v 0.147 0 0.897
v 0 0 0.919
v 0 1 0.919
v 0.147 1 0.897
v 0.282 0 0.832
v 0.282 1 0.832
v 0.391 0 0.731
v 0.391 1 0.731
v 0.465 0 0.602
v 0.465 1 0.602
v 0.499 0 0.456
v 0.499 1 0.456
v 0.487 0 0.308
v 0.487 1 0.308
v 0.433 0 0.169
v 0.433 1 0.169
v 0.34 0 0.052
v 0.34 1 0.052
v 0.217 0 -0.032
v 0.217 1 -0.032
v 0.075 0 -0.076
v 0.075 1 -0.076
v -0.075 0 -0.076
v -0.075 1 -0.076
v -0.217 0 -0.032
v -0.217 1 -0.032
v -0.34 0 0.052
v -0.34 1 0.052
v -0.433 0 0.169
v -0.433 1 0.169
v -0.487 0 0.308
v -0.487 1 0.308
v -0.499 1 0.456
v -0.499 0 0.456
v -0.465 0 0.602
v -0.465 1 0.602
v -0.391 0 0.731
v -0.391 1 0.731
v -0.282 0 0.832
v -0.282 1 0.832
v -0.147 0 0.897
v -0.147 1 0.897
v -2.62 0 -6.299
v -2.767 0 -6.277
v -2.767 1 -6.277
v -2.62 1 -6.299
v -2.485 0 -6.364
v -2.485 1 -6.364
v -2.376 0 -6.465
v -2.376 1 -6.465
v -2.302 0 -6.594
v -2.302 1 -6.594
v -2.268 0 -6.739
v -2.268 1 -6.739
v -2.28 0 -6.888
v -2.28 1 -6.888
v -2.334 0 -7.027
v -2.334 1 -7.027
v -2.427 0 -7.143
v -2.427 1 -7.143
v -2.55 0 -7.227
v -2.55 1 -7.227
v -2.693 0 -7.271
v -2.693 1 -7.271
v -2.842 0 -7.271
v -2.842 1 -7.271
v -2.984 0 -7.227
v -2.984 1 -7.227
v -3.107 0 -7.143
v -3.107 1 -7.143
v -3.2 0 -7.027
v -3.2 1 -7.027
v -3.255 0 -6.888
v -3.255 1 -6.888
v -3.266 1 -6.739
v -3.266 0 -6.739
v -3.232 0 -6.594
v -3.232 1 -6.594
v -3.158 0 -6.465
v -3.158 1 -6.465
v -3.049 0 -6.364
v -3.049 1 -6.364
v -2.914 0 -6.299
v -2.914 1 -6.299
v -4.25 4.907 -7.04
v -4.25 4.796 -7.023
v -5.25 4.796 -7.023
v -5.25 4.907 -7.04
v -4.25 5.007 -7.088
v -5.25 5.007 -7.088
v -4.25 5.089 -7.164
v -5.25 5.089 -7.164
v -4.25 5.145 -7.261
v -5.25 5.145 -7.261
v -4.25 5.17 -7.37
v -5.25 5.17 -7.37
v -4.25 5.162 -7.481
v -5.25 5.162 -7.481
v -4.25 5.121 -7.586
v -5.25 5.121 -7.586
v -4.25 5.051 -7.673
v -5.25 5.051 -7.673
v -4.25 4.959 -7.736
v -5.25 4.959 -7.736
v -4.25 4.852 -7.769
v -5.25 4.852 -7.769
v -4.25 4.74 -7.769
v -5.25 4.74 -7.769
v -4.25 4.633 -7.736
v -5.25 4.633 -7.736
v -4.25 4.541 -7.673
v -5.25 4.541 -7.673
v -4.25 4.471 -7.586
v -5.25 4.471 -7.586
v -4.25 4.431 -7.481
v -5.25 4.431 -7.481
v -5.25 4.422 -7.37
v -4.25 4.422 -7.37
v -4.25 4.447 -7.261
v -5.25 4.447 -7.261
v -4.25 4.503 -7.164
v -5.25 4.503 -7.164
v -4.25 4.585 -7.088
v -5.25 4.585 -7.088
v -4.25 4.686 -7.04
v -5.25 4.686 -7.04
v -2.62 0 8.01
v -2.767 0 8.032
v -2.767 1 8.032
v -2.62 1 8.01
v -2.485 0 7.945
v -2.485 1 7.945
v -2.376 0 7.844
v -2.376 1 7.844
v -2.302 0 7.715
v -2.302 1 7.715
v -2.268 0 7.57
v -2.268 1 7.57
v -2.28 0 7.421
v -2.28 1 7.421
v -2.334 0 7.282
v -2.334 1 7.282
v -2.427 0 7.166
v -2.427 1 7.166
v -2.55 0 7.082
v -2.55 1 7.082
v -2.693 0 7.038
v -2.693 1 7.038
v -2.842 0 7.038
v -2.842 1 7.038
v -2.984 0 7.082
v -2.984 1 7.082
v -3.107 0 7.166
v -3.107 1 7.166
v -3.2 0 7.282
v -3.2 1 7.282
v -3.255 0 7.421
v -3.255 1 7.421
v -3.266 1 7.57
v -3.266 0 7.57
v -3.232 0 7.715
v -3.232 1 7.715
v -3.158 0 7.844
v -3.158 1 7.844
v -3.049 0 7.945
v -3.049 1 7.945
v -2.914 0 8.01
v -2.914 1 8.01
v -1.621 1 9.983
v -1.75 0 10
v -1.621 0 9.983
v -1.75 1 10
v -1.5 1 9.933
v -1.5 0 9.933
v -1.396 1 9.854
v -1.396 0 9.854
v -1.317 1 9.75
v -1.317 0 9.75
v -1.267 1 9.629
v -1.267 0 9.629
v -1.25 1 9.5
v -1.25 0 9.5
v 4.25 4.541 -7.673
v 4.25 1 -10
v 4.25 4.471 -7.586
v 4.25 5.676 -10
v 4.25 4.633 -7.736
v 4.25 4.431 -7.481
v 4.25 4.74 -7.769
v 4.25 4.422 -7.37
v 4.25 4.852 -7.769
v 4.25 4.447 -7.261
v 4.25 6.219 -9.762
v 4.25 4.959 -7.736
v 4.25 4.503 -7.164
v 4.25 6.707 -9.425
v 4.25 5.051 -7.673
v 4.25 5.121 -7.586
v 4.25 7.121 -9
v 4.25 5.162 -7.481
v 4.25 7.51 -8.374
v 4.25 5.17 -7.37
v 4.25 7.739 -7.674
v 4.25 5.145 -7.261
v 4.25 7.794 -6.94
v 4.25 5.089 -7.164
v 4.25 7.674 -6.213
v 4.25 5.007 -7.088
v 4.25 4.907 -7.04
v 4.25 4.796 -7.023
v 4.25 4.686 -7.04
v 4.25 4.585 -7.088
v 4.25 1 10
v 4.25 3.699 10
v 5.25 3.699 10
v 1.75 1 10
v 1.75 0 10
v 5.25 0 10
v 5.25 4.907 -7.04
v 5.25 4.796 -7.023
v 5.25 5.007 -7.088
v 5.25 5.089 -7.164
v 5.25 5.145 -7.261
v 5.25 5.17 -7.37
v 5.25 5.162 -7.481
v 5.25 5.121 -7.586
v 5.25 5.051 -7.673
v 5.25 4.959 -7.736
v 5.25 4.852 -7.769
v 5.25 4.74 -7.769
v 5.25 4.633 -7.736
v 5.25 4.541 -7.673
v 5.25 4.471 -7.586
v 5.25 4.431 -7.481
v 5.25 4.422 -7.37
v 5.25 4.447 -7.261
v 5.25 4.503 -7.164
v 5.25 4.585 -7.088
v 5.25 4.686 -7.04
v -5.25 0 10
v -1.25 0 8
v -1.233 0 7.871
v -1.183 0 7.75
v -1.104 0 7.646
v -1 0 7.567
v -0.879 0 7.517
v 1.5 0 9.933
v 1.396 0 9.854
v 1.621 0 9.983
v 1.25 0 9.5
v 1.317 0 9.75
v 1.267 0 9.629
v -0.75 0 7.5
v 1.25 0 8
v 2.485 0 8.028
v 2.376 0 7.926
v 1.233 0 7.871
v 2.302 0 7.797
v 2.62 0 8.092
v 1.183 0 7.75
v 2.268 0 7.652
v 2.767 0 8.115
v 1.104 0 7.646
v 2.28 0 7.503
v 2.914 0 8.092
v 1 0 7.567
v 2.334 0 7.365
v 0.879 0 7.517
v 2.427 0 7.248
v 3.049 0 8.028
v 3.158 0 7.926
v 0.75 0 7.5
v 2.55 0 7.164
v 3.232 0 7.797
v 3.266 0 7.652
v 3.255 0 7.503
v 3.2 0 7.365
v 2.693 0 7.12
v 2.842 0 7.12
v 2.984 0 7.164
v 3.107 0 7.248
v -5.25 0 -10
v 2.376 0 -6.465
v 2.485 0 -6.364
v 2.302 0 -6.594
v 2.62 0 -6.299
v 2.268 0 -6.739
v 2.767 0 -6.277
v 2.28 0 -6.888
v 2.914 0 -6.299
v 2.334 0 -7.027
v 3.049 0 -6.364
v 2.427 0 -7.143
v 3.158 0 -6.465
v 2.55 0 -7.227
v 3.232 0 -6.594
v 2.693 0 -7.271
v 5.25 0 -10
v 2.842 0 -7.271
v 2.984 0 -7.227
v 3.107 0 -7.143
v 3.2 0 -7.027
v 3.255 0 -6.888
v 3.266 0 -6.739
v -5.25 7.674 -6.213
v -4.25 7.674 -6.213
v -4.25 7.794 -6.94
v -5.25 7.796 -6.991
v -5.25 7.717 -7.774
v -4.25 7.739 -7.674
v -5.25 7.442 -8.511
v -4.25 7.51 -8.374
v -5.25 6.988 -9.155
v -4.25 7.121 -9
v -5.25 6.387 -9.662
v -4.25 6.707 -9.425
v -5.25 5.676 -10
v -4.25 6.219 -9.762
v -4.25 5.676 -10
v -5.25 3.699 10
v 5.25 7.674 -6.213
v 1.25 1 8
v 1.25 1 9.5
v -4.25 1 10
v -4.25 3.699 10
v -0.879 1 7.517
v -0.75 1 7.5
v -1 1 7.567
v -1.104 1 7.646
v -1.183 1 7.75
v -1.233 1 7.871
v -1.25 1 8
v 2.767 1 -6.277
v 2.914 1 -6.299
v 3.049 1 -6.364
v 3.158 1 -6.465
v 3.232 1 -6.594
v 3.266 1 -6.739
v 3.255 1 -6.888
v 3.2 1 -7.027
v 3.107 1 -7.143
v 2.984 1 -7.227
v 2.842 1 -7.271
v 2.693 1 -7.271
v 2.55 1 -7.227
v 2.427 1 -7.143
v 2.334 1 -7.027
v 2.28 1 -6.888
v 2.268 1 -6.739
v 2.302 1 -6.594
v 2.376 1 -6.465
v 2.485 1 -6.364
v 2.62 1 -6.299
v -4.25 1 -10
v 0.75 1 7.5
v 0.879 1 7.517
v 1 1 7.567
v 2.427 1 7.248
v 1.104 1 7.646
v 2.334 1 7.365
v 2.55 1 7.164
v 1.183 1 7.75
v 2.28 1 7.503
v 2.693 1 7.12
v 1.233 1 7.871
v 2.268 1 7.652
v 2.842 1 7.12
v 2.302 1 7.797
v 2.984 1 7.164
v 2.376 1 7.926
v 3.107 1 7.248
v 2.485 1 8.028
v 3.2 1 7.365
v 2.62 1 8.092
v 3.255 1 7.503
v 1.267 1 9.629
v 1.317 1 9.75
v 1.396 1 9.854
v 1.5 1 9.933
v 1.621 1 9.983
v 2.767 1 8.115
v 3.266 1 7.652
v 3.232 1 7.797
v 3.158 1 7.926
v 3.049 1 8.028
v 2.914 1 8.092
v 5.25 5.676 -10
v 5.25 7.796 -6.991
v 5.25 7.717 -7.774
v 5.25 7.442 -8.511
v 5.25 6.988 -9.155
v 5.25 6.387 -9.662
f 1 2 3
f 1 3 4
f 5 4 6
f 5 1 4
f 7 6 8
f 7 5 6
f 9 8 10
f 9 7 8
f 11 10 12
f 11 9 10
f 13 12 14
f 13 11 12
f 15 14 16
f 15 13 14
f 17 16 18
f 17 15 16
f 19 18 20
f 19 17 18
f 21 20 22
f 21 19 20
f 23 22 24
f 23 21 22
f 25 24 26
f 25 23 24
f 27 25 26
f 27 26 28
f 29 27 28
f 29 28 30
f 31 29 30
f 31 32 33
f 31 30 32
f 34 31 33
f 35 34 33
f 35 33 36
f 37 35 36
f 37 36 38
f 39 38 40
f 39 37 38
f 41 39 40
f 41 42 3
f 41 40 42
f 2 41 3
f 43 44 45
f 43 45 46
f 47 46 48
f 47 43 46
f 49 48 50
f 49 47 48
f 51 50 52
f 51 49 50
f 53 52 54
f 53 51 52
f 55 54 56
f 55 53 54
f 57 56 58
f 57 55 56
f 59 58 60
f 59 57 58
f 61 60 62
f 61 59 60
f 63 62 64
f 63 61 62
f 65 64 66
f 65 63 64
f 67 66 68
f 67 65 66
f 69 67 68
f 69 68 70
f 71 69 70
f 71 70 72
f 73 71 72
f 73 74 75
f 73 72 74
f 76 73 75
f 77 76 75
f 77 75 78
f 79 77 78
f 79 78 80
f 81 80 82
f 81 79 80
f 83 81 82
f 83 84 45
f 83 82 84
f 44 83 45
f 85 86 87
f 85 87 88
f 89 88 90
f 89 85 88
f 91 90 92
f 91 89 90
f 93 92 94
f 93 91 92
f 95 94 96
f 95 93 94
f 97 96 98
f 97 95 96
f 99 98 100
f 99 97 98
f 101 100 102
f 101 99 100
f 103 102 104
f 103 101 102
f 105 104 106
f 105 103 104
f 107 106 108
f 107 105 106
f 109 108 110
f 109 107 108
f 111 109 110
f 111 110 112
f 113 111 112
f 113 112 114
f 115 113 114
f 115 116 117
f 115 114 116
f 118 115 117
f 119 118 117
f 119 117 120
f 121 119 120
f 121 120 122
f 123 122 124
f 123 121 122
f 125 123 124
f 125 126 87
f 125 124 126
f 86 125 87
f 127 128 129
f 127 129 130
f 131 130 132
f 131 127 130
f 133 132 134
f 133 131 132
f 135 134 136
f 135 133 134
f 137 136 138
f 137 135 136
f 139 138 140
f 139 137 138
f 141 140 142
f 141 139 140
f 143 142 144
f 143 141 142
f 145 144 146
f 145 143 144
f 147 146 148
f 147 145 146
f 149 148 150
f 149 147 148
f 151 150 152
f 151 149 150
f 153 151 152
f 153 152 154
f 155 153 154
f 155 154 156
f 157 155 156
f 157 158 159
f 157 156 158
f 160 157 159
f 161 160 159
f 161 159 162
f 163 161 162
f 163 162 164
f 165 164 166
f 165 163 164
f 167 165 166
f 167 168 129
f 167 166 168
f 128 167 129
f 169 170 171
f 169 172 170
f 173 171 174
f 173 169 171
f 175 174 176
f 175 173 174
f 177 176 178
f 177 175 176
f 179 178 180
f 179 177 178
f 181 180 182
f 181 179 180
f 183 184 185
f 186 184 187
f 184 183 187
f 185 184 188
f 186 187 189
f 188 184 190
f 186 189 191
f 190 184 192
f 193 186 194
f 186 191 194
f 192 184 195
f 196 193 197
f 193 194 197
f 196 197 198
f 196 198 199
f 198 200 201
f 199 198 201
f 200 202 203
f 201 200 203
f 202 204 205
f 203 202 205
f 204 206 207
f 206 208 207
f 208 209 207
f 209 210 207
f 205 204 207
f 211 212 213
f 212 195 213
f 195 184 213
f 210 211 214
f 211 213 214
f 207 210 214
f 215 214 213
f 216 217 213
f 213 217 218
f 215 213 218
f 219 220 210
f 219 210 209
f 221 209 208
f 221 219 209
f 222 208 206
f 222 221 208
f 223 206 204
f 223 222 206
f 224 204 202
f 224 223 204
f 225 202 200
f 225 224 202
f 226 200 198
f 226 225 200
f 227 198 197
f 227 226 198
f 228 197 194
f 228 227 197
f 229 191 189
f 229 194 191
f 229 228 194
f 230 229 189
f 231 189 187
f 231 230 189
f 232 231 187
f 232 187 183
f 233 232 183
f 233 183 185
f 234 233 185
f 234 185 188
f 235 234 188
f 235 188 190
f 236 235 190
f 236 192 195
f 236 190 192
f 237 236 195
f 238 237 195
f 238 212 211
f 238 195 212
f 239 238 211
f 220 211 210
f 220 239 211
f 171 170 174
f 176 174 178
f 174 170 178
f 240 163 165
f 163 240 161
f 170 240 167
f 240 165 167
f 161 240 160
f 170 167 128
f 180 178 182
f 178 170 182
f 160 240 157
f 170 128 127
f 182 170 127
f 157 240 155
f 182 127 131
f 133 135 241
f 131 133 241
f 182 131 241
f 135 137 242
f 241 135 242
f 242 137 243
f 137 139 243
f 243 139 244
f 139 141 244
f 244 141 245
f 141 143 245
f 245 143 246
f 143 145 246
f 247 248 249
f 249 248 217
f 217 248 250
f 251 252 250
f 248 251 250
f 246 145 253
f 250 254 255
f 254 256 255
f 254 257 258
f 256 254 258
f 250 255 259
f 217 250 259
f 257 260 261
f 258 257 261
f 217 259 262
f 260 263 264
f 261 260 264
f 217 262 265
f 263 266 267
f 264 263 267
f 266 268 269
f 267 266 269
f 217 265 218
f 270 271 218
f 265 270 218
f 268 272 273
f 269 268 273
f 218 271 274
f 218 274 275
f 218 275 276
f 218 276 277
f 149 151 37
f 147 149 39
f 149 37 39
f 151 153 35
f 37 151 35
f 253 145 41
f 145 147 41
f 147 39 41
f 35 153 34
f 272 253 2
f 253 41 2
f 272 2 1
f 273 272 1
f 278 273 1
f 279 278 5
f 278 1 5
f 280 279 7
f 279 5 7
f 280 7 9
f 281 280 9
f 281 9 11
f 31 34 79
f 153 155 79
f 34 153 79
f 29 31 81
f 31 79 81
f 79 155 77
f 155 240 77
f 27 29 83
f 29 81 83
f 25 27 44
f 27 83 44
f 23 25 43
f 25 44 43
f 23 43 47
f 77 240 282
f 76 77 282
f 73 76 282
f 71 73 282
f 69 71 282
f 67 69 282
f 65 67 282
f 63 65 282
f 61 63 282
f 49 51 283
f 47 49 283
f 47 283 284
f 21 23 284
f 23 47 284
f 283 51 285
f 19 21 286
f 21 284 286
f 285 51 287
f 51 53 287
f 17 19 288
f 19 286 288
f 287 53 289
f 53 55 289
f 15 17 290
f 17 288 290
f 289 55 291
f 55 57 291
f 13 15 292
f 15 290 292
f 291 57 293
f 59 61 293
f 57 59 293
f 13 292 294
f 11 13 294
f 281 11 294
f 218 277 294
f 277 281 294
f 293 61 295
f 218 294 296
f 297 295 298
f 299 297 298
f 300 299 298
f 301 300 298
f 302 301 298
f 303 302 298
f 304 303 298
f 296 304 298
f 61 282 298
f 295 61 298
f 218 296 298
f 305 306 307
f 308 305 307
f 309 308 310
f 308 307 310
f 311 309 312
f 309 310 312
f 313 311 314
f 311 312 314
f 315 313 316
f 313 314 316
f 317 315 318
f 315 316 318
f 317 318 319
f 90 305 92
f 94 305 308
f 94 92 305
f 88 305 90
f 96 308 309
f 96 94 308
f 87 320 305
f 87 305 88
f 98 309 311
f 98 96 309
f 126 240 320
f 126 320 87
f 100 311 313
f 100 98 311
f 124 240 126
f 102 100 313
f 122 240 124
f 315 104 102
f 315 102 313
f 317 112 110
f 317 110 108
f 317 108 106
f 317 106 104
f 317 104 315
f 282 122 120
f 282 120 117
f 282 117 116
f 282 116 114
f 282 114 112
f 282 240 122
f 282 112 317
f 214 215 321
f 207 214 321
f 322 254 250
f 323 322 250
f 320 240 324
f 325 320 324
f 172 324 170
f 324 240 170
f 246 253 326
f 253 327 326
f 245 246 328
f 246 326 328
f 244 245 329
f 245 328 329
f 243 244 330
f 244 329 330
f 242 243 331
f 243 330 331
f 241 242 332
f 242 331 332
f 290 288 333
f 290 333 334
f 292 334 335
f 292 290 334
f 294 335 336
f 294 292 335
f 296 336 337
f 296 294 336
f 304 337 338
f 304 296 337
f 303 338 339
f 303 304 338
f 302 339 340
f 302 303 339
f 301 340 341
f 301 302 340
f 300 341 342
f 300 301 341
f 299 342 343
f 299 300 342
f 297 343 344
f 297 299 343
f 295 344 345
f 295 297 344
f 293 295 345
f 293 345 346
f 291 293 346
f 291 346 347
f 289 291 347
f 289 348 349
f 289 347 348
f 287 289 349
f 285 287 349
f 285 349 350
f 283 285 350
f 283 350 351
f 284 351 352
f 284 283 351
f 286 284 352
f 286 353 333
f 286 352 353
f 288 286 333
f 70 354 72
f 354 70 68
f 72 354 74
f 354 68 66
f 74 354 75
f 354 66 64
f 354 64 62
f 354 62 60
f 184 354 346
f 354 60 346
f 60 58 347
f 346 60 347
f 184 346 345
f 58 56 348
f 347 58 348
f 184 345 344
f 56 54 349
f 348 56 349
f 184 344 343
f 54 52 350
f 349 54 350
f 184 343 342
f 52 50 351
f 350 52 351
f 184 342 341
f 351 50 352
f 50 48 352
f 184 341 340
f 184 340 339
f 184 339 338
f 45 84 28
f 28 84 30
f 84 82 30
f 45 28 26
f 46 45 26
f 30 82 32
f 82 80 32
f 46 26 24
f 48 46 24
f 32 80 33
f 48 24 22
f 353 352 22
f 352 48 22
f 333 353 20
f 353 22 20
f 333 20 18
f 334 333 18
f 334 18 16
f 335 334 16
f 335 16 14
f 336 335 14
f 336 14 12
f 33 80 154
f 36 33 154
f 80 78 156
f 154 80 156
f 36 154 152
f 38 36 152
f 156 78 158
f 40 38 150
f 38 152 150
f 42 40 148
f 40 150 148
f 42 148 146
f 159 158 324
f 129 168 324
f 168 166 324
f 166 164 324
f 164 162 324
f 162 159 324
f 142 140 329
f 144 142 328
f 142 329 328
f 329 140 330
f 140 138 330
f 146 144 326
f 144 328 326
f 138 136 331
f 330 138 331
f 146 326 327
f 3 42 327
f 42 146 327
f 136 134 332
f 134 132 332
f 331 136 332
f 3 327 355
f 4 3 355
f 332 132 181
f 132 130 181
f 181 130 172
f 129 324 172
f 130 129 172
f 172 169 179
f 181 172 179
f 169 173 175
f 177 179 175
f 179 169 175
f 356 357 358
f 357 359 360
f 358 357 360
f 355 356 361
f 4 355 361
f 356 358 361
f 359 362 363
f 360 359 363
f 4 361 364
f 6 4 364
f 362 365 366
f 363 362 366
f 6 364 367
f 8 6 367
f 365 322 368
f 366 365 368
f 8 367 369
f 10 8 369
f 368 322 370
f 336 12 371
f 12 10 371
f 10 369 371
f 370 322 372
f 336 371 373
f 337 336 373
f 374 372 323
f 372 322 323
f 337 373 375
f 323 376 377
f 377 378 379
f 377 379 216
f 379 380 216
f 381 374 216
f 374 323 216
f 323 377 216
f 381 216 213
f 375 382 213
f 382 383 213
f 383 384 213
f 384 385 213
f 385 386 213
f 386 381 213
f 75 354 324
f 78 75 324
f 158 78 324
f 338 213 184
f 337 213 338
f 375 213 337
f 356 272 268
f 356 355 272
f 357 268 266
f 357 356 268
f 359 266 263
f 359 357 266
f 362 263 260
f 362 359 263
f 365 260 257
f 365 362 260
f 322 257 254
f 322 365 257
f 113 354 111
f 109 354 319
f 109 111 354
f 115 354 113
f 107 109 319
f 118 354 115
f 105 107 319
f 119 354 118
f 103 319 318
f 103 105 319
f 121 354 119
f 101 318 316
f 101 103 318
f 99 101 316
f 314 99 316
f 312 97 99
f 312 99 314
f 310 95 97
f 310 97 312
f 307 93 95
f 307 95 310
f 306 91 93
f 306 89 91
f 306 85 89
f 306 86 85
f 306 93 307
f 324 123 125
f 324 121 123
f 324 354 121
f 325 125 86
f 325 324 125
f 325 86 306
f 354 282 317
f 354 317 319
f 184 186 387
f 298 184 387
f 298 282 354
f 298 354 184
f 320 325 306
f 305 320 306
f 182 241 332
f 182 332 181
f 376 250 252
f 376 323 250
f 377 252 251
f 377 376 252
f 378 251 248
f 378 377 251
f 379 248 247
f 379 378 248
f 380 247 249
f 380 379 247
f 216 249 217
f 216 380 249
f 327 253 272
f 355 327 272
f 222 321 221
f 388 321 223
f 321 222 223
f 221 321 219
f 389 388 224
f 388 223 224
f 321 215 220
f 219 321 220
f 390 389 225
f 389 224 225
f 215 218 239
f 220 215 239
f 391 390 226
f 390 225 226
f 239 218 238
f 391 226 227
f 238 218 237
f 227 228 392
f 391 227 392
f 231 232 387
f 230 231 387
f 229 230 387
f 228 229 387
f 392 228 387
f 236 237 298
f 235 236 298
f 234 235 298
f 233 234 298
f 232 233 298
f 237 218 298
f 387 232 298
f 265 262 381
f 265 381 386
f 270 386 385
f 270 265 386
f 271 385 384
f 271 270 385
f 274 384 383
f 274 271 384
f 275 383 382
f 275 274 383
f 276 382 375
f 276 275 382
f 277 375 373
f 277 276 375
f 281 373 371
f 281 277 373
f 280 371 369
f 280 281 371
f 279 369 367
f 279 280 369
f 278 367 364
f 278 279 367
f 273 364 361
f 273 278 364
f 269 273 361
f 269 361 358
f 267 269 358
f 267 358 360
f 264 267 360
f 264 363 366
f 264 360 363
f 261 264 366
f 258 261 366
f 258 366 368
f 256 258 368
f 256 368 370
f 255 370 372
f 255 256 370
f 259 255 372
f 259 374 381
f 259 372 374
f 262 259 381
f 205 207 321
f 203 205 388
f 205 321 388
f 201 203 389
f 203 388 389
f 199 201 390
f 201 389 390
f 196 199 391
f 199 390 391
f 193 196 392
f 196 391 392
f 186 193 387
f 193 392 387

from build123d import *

# Parameters (mm, degrees)
SKETCH1_W                = 10.5
SKETCH1_H                = 20
BOSS_EXTRUDE1_DEPTH      = 10
SHELL2_T                 = -1
SKETCH2_W                = 2.5
SKETCH2_H                = 2.5
CUT_EXTRUDE1_DEPTH       = 1
SKETCH3_W                = 8.5
SKETCH3_H                = 19
CUT_EXTRUDE2_DEPTH       = 1
CUT_EXTRUDE3_DEPTH       = 18.036725037
CUT_EXTRUDE3_DEPTH_BACK  = 18.036725037
SKETCH5_W                = 8.5
SKETCH5_H                = 6.121023644
CUT_EXTRUDE4_DEPTH       = 1
FILLET4_R                = 0.5
CUT_EXTRUDE9_DEPTH       = 17.463595639
CUT_EXTRUDE9_DEPTH_BACK  = 17.463595639
SKETCH10_R               = 0.375
CUT_EXTRUDE10_DEPTH      = 14.182094401
CUT_EXTRUDE10_DEPTH_BACK = 14.182094401
SKETCH11_R               = 0.5


with BuildPart() as part:
    # Sketch1 → Boss-Extrude1 (new body)
    with BuildSketch(Plane(origin=(0, 0, 0), x_dir=(1, 0, 0), z_dir=(0, 1, 0))):
        Rectangle(SKETCH1_W, SKETCH1_H)
    extrude(amount=BOSS_EXTRUDE1_DEPTH)

    # Shell2
    shell2_openings = [part.faces().sort_by_distance(p)[0] for p in [
        (0, 5, 10),
    ]]
    offset(amount=SHELL2_T, openings=shell2_openings, kind=Kind.INTERSECTION)

    # Sketch2 → Cut-Extrude1 (cut)
    with BuildSketch(Plane.XZ):
        with Locations((0, 8.75)):
            Rectangle(SKETCH2_W, SKETCH2_H)
    extrude(amount=-CUT_EXTRUDE1_DEPTH, mode=Mode.SUBTRACT)

    # Sketch3 → Cut-Extrude2 (cut)
    with BuildSketch(Plane.XZ.offset(-9)):
        with Locations((0, 0.5)):
            Rectangle(SKETCH3_W, SKETCH3_H)
    extrude(amount=-CUT_EXTRUDE2_DEPTH, mode=Mode.SUBTRACT)

    # Sketch4 → Cut-Extrude3 (cut, two sides: drawn at the far end of the back side and taken through both)
    with BuildSketch(Plane.ZY.offset(4.25).offset(-CUT_EXTRUDE3_DEPTH_BACK)):
        with BuildLine():
            Line((10, 10), (10, 3.699455157))
            Line((10, 3.699455157), (-6.213436391, 7.674325551))
            ThreePointArc((-6.213436391, 7.674325551), (-8.511231515, 7.441745527), (-10, 5.676094289))
            Line((-10, 5.676094289), (-10, 10))
            Line((-10, 10), (10, 10))
        make_face()
    extrude(amount=CUT_EXTRUDE3_DEPTH + CUT_EXTRUDE3_DEPTH_BACK, mode=Mode.SUBTRACT)

    # Sketch5 → Cut-Extrude4 (cut)
    with BuildSketch(Plane.XY.offset(-9)):
        with Locations((0, 4.060511822)):
            Rectangle(SKETCH5_W, SKETCH5_H)
    extrude(amount=-CUT_EXTRUDE4_DEPTH, mode=Mode.SUBTRACT)

    # Fillet4
    fillet4_edges = [part.edges().sort_by_distance(p)[0] for p in [
        (1.25, 0.5, 10),
        (1.25, 0.5, 7.5),
        (-1.25, 0.5, 7.5),
        (-1.25, 0.5, 10),
    ]]
    fillet(fillet4_edges, radius=FILLET4_R)

    # Sketch10 → Cut-Extrude9 (cut, two sides: drawn at the far end of the back side and taken through both)
    with BuildSketch(Plane.ZY.offset(5.25).offset(-CUT_EXTRUDE9_DEPTH_BACK)):
        with Locations((-7.398050854, 4.796107996)):
            Circle(SKETCH10_R)
    extrude(amount=CUT_EXTRUDE9_DEPTH + CUT_EXTRUDE9_DEPTH_BACK, mode=Mode.SUBTRACT)

    # Sketch11 → Cut-Extrude10 (cut, two sides: drawn at the far end of the back side and taken through both)
    with BuildSketch(Plane(origin=(0, 1, 0), x_dir=(1, 0, 0), z_dir=(0, 1, 0)).offset(-CUT_EXTRUDE10_DEPTH_BACK)):
        with Locations(Location((0, -0.418833411, 0), (0, 0, 270))):
            Circle(SKETCH11_R)
        with Locations(Location((2.767046964, -7.614528741, 0), (0, 0, 270))):
            Circle(SKETCH11_R)
        with Locations(Location((-2.767046964, -7.532135283, 0), (0, 0, 270))):
            Circle(SKETCH11_R)
        with Locations(Location((-2.767046964, 6.776861919, 0), (0, 0, 270))):
            Circle(SKETCH11_R)
        with Locations(Location((2.767046964, 6.776861919, 0), (0, 0, 270))):
            Circle(SKETCH11_R)
    extrude(amount=CUT_EXTRUDE10_DEPTH + CUT_EXTRUDE10_DEPTH_BACK, mode=Mode.SUBTRACT)


solid = part.part
